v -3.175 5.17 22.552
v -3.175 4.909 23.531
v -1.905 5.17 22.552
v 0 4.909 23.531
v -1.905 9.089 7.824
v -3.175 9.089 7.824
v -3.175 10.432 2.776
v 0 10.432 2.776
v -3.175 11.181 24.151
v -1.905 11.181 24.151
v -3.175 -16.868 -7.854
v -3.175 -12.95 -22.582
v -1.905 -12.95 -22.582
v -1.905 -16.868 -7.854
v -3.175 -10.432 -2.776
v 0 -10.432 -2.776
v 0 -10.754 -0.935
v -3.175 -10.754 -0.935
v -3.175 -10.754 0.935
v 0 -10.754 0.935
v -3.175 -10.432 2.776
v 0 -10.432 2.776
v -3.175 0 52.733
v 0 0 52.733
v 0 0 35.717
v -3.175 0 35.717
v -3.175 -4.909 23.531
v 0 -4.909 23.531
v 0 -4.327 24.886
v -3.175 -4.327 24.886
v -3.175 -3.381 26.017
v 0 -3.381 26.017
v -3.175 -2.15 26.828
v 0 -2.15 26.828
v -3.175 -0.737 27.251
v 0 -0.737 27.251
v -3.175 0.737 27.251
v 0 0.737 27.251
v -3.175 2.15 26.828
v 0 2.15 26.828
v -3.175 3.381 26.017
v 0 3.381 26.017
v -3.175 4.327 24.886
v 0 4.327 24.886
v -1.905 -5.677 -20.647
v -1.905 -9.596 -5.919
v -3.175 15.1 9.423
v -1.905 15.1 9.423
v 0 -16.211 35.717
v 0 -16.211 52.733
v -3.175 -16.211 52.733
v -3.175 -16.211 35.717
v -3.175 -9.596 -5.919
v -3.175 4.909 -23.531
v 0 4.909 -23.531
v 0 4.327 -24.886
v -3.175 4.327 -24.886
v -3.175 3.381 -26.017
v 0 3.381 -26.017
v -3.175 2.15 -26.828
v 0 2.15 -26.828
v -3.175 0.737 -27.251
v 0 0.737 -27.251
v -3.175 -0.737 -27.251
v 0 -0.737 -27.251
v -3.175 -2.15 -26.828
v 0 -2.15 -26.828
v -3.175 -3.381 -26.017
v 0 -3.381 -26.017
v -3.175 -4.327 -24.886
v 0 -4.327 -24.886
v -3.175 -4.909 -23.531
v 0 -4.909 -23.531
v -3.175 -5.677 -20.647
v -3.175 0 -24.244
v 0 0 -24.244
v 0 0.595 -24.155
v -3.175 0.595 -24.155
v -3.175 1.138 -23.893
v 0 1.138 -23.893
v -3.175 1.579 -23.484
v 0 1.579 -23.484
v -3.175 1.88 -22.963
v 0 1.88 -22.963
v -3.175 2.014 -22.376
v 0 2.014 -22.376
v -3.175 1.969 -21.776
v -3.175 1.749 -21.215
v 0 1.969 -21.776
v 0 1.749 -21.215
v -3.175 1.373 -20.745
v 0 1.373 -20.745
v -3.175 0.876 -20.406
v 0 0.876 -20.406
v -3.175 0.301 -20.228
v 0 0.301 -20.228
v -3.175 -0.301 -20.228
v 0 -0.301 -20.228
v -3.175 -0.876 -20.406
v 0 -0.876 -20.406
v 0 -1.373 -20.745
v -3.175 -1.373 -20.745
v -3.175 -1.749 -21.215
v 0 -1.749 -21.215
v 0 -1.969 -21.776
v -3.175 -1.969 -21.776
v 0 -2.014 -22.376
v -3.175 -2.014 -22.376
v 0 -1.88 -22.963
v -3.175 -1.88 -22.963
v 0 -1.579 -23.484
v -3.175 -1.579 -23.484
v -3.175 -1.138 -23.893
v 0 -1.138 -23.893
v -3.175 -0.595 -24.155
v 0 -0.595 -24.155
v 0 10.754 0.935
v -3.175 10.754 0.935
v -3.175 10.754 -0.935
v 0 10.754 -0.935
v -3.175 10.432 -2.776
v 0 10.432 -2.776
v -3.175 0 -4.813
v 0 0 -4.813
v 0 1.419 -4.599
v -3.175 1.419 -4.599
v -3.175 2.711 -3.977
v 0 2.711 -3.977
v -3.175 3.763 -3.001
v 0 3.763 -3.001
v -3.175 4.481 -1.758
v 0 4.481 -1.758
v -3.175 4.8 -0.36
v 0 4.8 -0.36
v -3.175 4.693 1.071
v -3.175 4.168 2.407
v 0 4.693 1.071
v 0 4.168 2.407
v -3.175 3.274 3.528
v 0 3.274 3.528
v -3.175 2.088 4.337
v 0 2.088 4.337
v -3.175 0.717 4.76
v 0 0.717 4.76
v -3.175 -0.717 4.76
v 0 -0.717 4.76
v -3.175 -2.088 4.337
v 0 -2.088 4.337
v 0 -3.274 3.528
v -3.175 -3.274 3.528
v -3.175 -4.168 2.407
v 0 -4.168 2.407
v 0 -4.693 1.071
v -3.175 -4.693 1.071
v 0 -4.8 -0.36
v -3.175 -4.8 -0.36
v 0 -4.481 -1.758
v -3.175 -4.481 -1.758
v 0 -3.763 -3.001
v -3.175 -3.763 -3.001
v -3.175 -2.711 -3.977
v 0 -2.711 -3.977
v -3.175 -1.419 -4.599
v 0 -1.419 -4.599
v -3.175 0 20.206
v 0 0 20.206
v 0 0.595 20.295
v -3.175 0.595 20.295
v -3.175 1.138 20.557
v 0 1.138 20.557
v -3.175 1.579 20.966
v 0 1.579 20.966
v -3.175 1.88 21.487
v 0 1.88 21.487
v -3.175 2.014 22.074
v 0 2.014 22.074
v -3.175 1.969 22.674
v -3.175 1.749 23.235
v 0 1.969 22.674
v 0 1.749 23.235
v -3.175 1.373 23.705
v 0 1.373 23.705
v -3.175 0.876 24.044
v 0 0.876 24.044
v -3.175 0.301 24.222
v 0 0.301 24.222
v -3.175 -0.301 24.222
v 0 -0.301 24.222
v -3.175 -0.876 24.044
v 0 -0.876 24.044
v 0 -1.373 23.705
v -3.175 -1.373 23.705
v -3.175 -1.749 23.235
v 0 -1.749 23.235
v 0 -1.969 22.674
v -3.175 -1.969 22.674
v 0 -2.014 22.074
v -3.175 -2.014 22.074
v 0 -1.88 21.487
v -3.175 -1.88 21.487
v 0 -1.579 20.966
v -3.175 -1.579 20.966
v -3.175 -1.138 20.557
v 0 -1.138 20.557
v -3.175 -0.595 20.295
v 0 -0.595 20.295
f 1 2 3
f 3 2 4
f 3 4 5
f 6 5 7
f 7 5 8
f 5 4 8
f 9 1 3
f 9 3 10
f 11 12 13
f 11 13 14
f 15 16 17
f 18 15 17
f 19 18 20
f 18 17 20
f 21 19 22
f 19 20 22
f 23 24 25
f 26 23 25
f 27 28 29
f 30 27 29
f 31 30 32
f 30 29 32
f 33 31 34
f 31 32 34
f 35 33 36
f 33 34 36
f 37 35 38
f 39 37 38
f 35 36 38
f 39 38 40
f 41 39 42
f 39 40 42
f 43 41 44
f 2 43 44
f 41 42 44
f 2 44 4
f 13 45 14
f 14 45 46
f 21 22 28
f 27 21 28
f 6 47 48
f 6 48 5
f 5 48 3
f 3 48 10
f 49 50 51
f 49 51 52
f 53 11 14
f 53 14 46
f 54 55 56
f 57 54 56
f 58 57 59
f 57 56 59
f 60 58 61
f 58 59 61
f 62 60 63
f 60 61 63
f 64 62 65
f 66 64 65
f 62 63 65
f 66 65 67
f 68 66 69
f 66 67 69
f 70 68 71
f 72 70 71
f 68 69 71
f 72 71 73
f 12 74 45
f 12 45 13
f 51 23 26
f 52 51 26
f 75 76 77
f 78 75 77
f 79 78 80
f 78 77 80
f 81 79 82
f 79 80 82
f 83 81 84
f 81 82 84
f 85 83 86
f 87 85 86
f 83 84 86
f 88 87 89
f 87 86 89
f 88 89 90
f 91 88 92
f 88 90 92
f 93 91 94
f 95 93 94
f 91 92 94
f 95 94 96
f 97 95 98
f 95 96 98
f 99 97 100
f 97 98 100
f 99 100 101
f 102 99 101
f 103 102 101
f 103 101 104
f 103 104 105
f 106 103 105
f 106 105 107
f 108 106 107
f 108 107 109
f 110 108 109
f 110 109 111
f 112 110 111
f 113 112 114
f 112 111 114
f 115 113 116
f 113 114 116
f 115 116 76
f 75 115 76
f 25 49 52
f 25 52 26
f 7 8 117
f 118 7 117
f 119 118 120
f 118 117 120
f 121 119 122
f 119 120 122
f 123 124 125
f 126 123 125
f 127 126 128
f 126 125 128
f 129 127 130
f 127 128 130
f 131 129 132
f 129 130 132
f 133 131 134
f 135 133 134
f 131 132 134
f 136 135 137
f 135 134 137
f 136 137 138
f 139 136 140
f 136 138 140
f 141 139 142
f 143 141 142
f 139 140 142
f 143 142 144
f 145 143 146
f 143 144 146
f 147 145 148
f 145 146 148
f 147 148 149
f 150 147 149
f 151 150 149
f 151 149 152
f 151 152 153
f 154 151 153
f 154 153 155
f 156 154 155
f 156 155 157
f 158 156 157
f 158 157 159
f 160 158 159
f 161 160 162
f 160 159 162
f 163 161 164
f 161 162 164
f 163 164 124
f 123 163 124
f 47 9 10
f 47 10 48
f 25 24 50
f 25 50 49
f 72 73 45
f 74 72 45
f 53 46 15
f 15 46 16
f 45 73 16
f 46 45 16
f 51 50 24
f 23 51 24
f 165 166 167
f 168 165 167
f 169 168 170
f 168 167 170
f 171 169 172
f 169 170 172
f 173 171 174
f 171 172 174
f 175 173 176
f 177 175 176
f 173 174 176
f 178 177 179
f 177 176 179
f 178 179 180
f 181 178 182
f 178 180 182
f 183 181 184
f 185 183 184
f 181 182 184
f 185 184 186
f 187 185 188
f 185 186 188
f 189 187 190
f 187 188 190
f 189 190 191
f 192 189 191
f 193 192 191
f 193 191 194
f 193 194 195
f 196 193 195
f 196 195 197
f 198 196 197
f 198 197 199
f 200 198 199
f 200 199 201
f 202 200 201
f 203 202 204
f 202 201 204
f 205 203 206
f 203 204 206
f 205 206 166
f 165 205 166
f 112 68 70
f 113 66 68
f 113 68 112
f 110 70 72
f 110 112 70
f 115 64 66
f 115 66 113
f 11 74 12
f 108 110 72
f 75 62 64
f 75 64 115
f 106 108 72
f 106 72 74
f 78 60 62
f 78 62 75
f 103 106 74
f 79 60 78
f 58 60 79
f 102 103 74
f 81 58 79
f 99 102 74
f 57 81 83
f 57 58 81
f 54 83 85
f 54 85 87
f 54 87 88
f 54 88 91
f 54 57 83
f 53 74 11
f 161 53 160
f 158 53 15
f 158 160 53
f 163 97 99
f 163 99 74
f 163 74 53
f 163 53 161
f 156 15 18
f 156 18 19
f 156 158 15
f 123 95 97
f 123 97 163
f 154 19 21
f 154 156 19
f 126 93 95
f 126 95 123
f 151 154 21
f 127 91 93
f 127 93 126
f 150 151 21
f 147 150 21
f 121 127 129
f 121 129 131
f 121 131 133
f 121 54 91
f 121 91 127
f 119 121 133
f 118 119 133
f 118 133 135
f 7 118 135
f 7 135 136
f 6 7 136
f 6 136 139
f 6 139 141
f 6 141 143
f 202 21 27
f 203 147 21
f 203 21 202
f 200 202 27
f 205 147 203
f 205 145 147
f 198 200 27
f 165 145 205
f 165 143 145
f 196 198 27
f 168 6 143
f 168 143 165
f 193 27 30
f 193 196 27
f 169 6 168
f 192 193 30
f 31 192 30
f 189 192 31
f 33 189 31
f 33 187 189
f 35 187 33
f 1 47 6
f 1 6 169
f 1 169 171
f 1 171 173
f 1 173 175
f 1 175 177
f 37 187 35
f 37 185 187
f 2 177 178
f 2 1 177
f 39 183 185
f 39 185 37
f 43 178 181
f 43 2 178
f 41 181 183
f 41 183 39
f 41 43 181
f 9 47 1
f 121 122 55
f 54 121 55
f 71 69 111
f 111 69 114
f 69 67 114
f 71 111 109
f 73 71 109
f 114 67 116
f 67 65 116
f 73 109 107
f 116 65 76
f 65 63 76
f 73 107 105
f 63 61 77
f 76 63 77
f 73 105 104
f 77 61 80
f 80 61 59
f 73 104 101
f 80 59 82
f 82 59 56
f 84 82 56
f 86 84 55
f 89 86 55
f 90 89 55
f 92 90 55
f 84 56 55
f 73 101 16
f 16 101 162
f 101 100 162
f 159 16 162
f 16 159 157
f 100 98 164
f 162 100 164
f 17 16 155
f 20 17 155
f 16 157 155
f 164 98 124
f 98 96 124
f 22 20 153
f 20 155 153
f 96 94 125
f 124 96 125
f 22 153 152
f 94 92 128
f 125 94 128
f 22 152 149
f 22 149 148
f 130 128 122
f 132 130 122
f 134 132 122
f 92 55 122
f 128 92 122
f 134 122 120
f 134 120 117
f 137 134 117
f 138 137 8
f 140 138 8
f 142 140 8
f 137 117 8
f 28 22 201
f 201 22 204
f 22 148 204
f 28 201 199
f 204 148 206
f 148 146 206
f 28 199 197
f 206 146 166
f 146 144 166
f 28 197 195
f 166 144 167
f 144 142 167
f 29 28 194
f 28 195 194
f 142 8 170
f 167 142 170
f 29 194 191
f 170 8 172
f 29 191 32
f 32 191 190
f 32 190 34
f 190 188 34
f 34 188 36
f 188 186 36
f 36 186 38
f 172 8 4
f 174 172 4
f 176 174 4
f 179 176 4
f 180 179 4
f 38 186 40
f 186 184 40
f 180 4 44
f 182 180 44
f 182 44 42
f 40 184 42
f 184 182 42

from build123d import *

# Parameters (mm, degrees)
SKETCH1_R           = 2.0193
SKETCH1_R_2         = 4.8133
BASE_FLANGE1_DEPTH  = 3.175
SKETCH2_W           = 17.015394269
SKETCH2_H           = 16.210936875
BOSS_EXTRUDE1_DEPTH = 3.175
BOSS_EXTRUDE2_DEPTH = 1.27


# Sheet-metal steps are written as plain solids
with BuildPart() as part:
    # Sketch1 → Base-Flange1 (new body)
    with BuildSketch(Plane(origin=(0, 0, 0), x_dir=(0, 0, -1), z_dir=(1, 0, 0))):
        with BuildLine():
            Line((-23.531285714, 4.909176879), (-2.775857143, 10.432000869))
            ThreePointArc((-2.775857143, 10.432000869), (0, 10.795), (2.775857143, 10.432000869))
            Line((2.775857143, 10.432000869), (23.531285714, 4.909176879))
            ThreePointArc((23.531285714, 4.909176879), (27.305, 0), (23.531285714, -4.909176879))
            Line((23.531285714, -4.909176879), (2.775857143, -10.432000869))
            ThreePointArc((2.775857143, -10.432000869), (0, -10.795), (-2.775857143, -10.432000869))
            Line((-2.775857143, -10.432000869), (-23.531285714, -4.909176879))
            ThreePointArc((-23.531285714, -4.909176879), (-27.305, 0), (-23.531285714, 4.909176879))
        make_face()
        with Locations((-22.225, 0)):
            Circle(SKETCH1_R, mode=Mode.SUBTRACT)
        with Locations((22.225, 0)):
            Circle(SKETCH1_R, mode=Mode.SUBTRACT)
        Circle(SKETCH1_R_2, mode=Mode.SUBTRACT)
    extrude(amount=-BASE_FLANGE1_DEPTH)

    # Sketch6 → Boss-Extrude2 (add)
    with BuildSketch(Plane.ZY.offset(3.175)):
        Polygon((-5.91907135, -9.595621183), (-20.646601988, -5.67676404), (-22.581830021, -12.949580859), (-7.854299383, -16.868438002), align=None)
        Polygon((7.823980768, 9.088742734), (22.551511406, 5.169885592), (24.150988111, 11.180909039), (9.423457473, 15.099766182), align=None)
    extrude(amount=-BOSS_EXTRUDE2_DEPTH)


with BuildPart() as body_2:
    # Sketch2 → Boss-Extrude1 (new body)
    with BuildSketch(Plane(origin=(0, 0, 0), x_dir=(0, 0, -1), z_dir=(1, 0, 0))):
        with Locations((-44.224918413, -8.105468438)):
            Rectangle(SKETCH2_W, SKETCH2_H)
    extrude(amount=-BOSS_EXTRUDE1_DEPTH)


solid = Compound([part.part, body_2.part])
